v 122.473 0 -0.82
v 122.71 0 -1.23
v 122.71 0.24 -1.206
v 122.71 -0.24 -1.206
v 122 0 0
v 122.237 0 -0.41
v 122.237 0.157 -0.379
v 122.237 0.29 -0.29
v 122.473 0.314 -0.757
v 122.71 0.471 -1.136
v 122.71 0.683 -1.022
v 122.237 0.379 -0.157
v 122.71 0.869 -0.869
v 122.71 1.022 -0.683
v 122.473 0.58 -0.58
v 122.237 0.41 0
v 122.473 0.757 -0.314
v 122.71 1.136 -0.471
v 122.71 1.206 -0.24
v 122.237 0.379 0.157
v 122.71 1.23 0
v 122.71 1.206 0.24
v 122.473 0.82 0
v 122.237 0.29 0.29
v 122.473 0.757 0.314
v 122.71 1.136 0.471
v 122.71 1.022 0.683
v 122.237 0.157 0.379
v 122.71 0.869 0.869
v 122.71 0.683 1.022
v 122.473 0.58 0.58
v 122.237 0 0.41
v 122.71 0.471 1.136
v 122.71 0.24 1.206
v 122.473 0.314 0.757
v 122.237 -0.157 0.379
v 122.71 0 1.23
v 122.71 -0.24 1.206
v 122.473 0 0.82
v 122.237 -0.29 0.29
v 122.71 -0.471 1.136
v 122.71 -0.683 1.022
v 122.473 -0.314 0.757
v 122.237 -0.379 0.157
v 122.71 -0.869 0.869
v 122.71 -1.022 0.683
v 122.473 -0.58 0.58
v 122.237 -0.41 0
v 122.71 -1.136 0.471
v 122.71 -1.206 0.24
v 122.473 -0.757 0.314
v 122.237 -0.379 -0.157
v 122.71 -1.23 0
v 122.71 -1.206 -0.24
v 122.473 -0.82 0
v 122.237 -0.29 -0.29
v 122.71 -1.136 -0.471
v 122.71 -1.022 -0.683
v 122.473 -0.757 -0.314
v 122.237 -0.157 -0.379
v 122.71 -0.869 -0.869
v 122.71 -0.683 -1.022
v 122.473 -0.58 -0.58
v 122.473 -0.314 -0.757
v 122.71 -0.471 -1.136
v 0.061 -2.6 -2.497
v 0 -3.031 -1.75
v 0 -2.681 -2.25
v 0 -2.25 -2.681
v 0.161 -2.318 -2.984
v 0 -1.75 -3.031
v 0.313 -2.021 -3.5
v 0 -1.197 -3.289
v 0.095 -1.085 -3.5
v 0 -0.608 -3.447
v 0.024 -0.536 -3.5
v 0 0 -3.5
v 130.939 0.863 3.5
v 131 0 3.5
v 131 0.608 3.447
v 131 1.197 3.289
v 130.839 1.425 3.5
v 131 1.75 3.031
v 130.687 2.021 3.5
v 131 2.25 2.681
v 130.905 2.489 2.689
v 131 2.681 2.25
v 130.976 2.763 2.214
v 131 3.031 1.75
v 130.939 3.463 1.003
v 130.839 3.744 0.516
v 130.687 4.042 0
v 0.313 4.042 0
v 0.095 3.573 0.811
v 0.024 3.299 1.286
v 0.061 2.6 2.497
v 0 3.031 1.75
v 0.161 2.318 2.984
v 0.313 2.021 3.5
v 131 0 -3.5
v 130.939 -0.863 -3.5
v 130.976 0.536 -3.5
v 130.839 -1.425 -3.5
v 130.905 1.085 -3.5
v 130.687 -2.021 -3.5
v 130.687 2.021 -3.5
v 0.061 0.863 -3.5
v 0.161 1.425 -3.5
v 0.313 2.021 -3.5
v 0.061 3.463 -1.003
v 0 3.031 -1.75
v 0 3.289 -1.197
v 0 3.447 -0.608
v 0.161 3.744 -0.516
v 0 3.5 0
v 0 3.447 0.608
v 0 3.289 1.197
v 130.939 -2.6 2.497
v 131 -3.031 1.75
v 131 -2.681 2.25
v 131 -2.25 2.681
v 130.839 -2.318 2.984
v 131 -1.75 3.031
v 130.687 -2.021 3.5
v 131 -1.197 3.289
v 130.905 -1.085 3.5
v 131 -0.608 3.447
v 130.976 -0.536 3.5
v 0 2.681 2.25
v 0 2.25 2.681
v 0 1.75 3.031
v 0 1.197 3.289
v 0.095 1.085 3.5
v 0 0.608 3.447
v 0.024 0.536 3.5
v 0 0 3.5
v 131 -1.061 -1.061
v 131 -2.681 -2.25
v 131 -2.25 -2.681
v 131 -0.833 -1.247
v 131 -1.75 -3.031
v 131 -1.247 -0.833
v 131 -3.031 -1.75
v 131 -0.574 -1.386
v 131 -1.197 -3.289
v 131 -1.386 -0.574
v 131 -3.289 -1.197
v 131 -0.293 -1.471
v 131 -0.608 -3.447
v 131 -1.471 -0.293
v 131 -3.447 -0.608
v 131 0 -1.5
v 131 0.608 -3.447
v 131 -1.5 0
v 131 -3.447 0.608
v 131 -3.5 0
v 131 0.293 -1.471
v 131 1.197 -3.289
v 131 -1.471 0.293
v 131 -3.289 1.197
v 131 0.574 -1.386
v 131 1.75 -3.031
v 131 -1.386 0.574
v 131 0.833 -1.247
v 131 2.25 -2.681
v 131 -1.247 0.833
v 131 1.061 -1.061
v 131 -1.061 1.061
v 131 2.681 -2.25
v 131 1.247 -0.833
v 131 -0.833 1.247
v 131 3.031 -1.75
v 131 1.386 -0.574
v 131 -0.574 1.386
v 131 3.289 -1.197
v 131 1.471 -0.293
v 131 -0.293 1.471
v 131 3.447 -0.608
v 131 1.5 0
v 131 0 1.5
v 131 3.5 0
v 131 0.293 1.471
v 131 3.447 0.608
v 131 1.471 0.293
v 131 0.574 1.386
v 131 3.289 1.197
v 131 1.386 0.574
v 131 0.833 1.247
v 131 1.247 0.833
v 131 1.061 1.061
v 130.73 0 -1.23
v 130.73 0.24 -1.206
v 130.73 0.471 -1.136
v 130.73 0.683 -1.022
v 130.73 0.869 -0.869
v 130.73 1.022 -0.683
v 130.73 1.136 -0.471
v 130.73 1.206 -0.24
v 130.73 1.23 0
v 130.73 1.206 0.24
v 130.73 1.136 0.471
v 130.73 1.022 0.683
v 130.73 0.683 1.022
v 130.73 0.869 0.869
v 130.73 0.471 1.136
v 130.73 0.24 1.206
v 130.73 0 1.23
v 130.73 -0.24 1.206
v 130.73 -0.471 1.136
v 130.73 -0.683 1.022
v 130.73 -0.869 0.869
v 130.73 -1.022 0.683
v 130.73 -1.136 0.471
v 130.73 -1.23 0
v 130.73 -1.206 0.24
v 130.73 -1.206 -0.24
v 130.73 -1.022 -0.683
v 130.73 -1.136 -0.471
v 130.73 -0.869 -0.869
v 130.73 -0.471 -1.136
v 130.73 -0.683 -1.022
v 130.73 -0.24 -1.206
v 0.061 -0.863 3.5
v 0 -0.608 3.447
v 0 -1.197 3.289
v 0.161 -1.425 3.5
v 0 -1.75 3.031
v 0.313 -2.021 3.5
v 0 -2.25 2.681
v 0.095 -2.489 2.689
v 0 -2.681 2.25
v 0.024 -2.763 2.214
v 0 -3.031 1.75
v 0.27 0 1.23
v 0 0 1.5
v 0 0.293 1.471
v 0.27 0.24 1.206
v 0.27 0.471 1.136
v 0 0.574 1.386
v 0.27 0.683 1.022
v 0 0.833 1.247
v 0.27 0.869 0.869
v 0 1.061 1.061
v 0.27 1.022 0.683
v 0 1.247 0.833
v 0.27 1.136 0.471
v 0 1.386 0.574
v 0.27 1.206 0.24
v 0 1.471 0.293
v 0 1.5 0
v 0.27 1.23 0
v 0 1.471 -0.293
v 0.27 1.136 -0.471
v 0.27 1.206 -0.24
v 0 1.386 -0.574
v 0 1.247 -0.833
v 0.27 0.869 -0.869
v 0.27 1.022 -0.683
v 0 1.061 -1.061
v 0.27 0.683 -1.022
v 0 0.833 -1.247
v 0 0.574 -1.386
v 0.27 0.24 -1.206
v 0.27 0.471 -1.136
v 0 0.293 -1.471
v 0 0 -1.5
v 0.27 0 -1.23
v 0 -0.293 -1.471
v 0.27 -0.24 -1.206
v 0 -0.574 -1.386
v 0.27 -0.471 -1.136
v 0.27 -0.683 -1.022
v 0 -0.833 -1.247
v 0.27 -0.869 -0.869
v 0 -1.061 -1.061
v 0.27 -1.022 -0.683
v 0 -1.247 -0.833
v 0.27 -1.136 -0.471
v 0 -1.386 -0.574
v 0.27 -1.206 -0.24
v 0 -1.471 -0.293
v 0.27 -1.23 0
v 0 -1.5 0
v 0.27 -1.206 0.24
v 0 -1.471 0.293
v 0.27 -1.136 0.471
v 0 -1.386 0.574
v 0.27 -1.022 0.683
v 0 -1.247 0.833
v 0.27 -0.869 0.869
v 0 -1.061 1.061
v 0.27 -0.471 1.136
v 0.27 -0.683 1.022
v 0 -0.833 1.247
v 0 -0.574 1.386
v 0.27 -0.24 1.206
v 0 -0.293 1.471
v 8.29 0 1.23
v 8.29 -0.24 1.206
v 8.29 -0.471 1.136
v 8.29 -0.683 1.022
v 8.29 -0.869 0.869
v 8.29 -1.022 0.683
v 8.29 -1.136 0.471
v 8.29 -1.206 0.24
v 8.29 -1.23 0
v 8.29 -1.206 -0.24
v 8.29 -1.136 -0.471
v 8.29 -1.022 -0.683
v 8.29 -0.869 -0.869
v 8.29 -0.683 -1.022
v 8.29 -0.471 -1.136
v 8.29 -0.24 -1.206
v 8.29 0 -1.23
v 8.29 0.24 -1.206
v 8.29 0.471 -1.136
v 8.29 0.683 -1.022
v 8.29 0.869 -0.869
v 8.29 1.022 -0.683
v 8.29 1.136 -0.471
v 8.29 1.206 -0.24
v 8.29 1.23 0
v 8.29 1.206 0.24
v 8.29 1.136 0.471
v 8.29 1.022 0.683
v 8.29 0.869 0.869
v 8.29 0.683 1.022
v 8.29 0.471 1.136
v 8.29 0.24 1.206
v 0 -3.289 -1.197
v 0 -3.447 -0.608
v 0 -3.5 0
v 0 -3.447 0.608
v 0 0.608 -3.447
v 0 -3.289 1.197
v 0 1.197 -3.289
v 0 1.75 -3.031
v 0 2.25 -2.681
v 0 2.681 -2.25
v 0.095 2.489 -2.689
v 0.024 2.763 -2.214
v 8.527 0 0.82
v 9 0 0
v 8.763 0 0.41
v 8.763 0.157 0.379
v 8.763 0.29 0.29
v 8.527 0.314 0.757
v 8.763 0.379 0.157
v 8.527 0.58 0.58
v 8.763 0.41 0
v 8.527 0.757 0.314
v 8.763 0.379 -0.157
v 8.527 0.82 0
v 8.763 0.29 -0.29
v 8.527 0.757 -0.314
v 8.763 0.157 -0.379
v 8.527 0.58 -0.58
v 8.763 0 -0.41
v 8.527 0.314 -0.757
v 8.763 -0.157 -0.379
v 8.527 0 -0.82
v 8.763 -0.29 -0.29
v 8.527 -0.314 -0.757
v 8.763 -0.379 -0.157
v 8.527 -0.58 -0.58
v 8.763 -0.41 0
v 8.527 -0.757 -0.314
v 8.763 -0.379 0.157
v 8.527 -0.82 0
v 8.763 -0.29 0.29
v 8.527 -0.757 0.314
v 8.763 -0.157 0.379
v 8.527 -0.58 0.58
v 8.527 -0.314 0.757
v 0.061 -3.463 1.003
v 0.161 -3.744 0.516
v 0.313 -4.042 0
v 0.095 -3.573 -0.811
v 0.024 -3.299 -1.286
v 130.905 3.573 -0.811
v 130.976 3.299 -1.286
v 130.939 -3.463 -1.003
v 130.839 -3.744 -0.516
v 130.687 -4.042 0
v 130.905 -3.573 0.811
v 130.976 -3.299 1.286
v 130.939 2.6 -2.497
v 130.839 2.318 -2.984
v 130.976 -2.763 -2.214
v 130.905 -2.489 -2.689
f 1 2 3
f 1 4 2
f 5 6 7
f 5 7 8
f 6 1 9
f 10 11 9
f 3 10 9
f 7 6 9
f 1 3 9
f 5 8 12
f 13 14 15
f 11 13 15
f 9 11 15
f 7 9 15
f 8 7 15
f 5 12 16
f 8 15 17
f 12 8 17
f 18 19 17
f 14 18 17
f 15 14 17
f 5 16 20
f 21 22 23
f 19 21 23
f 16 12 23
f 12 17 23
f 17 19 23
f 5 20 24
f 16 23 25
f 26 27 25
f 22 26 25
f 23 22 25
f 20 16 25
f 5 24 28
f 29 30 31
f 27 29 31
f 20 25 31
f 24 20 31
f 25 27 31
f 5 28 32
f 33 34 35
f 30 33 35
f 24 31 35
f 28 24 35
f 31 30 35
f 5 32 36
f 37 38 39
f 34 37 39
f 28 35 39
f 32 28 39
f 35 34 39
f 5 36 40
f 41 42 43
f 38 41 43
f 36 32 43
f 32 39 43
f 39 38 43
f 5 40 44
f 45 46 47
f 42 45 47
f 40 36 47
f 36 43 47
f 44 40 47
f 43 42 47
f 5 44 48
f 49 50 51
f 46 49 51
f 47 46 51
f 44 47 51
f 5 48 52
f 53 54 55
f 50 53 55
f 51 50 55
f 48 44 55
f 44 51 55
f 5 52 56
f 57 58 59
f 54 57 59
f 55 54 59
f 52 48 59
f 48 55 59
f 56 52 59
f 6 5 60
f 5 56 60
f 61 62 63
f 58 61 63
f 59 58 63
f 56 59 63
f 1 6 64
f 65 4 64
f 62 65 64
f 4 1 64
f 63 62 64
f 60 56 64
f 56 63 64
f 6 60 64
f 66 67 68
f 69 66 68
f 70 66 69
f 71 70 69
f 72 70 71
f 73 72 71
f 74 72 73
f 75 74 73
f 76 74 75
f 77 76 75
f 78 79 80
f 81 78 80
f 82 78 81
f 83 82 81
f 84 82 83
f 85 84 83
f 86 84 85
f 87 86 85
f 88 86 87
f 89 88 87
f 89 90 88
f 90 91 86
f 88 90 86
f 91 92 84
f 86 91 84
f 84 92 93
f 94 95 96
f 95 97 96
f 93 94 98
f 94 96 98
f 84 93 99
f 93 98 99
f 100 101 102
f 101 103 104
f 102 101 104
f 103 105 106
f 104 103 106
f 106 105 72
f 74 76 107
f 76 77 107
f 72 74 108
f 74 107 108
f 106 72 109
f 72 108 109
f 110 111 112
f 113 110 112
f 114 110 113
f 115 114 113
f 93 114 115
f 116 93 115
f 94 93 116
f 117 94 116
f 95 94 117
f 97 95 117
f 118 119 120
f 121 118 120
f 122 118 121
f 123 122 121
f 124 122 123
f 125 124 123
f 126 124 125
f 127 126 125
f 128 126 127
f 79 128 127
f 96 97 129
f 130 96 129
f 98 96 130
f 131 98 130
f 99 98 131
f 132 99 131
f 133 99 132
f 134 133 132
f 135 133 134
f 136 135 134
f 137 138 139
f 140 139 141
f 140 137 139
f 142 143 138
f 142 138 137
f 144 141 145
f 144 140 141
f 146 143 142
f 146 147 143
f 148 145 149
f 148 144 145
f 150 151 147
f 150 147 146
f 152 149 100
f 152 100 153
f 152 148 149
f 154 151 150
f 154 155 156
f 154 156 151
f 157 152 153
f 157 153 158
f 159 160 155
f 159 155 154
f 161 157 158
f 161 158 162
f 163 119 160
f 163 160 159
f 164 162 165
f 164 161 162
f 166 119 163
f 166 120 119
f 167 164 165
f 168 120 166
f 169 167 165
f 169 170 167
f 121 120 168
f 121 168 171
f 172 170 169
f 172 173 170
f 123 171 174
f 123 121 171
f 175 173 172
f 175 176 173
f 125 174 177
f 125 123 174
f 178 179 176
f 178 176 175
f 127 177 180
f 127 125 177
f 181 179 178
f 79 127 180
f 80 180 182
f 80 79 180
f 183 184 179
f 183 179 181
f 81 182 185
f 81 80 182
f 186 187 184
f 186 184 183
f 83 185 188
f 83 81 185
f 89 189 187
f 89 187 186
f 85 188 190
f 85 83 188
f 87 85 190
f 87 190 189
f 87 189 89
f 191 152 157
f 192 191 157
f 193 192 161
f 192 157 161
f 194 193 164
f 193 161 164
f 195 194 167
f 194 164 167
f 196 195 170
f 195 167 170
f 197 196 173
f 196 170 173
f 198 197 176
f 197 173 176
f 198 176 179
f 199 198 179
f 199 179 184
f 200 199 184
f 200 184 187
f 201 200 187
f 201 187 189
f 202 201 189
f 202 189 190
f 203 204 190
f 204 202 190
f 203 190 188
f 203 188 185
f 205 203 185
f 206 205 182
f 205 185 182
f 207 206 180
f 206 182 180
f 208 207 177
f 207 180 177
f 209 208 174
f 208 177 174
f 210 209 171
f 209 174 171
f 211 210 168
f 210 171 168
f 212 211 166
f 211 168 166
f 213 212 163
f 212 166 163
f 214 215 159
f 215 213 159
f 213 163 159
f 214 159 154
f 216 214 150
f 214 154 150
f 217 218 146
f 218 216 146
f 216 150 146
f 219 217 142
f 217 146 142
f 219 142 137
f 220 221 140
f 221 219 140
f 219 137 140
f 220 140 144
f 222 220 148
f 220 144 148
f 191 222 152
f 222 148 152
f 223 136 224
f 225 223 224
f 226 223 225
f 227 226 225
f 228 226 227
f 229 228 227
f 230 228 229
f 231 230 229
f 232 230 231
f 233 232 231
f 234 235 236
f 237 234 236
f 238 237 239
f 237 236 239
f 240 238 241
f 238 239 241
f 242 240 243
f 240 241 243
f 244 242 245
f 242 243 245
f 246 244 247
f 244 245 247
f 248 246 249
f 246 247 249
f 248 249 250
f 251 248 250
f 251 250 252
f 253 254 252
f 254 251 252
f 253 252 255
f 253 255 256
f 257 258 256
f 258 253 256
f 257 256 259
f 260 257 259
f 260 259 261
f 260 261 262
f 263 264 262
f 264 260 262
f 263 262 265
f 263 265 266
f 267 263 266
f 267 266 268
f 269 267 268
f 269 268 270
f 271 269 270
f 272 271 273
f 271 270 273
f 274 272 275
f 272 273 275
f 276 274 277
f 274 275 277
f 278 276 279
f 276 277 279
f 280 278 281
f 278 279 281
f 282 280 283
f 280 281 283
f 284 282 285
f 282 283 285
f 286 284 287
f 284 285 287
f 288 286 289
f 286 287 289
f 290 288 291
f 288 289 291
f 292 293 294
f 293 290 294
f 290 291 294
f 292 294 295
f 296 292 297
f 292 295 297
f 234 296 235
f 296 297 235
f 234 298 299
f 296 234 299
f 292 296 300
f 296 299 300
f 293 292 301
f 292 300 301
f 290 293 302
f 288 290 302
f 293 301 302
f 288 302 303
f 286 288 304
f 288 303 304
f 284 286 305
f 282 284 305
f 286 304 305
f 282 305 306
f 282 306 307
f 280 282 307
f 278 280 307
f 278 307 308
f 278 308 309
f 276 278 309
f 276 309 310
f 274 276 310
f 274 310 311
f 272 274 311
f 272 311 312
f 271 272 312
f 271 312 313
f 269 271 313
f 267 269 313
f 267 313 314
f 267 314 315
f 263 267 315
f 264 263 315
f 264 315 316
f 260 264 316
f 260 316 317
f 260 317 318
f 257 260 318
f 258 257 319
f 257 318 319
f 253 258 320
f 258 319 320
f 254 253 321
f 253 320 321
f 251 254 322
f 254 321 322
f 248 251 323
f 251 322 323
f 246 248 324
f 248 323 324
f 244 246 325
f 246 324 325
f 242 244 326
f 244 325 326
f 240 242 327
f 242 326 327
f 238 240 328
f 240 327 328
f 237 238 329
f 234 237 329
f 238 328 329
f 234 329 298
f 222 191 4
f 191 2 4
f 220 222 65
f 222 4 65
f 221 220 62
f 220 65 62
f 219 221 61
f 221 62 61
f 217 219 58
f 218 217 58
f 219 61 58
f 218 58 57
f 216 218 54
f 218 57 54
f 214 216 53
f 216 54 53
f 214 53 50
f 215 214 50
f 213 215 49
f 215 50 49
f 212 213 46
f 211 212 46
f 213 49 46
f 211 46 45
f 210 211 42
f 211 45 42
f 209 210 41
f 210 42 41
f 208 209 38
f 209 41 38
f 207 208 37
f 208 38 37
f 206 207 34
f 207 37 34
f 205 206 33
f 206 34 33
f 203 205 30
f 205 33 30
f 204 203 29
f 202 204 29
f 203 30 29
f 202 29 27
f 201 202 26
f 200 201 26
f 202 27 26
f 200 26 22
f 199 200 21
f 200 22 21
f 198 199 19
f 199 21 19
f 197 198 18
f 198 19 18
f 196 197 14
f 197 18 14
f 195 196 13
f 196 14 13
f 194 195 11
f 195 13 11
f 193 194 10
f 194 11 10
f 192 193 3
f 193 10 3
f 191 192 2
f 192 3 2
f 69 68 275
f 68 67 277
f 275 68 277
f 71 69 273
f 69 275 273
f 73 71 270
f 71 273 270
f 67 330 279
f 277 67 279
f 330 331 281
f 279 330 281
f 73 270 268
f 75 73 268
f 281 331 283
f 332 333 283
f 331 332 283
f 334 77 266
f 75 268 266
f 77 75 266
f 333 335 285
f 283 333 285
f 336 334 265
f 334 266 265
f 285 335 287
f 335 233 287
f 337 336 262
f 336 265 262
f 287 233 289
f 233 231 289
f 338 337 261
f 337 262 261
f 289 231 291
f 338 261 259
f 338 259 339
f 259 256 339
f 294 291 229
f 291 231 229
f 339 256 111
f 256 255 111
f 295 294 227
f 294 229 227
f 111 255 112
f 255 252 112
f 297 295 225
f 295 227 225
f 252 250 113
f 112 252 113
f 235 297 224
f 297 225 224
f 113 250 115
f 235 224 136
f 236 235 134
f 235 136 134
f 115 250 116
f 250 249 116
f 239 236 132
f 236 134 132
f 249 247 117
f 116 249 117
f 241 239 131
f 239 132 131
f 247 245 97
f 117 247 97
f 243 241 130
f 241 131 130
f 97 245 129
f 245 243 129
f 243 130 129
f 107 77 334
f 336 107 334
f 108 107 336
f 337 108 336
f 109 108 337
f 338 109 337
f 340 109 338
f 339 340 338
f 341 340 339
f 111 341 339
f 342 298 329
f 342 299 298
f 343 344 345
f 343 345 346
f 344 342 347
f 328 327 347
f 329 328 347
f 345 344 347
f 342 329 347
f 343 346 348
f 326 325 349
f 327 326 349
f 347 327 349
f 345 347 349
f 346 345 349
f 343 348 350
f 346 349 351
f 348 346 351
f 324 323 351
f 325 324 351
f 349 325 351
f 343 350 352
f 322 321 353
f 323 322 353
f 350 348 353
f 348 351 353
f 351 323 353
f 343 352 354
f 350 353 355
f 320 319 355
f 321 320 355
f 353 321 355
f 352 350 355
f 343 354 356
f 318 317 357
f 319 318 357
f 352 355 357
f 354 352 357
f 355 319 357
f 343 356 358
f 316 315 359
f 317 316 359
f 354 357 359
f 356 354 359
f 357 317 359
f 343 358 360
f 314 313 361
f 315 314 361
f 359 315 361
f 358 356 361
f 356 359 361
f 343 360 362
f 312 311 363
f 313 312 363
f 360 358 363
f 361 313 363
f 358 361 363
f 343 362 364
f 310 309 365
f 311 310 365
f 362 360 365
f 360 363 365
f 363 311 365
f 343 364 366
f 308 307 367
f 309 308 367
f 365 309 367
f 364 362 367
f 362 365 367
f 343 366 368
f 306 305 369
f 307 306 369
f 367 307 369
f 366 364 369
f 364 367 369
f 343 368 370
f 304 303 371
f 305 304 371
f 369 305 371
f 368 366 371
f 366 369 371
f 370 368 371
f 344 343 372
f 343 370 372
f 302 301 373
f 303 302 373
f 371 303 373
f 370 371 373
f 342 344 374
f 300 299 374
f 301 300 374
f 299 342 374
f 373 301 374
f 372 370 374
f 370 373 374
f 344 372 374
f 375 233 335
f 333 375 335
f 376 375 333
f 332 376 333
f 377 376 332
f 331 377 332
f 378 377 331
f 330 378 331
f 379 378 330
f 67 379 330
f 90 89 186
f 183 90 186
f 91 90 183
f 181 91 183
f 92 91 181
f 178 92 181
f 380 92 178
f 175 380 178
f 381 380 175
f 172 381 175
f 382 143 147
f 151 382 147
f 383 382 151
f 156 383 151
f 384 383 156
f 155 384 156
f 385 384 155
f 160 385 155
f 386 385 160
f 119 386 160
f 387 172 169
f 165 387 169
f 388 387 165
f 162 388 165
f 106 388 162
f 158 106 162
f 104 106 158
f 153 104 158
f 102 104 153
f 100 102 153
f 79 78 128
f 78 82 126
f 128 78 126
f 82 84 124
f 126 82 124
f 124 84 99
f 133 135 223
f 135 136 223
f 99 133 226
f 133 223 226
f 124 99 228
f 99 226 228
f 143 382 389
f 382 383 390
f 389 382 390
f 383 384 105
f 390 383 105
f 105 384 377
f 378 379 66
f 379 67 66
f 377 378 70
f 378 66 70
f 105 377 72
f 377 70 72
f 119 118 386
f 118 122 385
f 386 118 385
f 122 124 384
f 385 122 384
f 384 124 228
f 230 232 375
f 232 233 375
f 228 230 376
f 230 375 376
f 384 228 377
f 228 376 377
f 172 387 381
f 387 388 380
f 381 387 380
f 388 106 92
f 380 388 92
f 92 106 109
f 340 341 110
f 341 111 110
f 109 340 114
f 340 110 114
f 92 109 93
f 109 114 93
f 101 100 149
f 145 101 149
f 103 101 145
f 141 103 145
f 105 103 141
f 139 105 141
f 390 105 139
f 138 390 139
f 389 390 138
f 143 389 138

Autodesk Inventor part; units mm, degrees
sketch "Sketch_1" plane through (0, 0, 0) normal (0, 0, 1) x (1, 0, 0)
  line L0 (131, 0) -> (0, 0)
  line L1 (0, 0) -> (0, 3.5)
  line L2 (0, 3.5) -> (0.6062, 4.55)
  line L3 (0.6062, 4.55) -> (130.3938, 4.55)
  line L4 (130.3938, 4.55) -> (131, 3.5)
  line L5 (131, 3.5) -> (131, 0)
  line L6 (131, 0) -> (0, 0)
revolve "Revolution1" add sketch "Sketch_1" angle 360 about axis through (131, 0, 0) along (1, 0, 0)
sketch "Sketch_2" plane through (0, 0, 0) normal (1, 0, 0) x (0, 1, 0)
  line L0 (7, 7) -> (-7, 7)
  line L1 (-7, 7) -> (-7, -7)
  line L2 (-7, -7) -> (7, -7)
  line L3 (7, -7) -> (7, 7)
  line L4 (-2.0207, 3.5) -> (-4.0415, 0)
  line L5 (-4.0415, 0) -> (-2.0207, -3.5)
  line L6 (-2.0207, -3.5) -> (2.0207, -3.5)
  line L7 (2.0207, -3.5) -> (4.0415, 0)
  line L8 (4.0415, 0) -> (2.0207, 3.5)
  line L9 (2.0207, 3.5) -> (-2.0207, 3.5)
extrude "Extrusion1" cut sketch "Sketch_2" along normal blind 131
sketch "Sketch3" plane through (0, 0, 0) normal (-1, 0, 0) x (0, 0, 1)
  point P0 (0, 0)
hole "Hole1" at (0, 0, 0) direction (1, 0, 0) diameter 2.459 depth 8.2901 tip angle 120 countersink diameter 3 countersink angle 90 thread size "M3x0.5" class "6H" standard "ISO Metric profile"
sketch "Sketch4" plane through (131, 0, 0) normal (1, 0, 0) x (0, 0, -1)
  point P0 (0, 0)
hole "Hole2" at (131, 0, 0) direction (-1, 0, 0) diameter 2.459 depth 8.2901 tip angle 120 countersink diameter 3 countersink angle 90 thread size "M3x0.5" class "6H" standard "ISO Metric profile"
ref_plane "C3_XY" through (131, 0, 0) normal (-1, 0, 0) x (0, 0, -1)
ref_plane "C3_YZ" through (131, 0, 0) normal (0, 0, -1) x (0, -1, 0)
ref_plane "C3_ZX" through (131, 0, 0) normal (0, -1, 0) x (-1, 0, 0)
properties part number "SLSBF7-131-M3-N3"
